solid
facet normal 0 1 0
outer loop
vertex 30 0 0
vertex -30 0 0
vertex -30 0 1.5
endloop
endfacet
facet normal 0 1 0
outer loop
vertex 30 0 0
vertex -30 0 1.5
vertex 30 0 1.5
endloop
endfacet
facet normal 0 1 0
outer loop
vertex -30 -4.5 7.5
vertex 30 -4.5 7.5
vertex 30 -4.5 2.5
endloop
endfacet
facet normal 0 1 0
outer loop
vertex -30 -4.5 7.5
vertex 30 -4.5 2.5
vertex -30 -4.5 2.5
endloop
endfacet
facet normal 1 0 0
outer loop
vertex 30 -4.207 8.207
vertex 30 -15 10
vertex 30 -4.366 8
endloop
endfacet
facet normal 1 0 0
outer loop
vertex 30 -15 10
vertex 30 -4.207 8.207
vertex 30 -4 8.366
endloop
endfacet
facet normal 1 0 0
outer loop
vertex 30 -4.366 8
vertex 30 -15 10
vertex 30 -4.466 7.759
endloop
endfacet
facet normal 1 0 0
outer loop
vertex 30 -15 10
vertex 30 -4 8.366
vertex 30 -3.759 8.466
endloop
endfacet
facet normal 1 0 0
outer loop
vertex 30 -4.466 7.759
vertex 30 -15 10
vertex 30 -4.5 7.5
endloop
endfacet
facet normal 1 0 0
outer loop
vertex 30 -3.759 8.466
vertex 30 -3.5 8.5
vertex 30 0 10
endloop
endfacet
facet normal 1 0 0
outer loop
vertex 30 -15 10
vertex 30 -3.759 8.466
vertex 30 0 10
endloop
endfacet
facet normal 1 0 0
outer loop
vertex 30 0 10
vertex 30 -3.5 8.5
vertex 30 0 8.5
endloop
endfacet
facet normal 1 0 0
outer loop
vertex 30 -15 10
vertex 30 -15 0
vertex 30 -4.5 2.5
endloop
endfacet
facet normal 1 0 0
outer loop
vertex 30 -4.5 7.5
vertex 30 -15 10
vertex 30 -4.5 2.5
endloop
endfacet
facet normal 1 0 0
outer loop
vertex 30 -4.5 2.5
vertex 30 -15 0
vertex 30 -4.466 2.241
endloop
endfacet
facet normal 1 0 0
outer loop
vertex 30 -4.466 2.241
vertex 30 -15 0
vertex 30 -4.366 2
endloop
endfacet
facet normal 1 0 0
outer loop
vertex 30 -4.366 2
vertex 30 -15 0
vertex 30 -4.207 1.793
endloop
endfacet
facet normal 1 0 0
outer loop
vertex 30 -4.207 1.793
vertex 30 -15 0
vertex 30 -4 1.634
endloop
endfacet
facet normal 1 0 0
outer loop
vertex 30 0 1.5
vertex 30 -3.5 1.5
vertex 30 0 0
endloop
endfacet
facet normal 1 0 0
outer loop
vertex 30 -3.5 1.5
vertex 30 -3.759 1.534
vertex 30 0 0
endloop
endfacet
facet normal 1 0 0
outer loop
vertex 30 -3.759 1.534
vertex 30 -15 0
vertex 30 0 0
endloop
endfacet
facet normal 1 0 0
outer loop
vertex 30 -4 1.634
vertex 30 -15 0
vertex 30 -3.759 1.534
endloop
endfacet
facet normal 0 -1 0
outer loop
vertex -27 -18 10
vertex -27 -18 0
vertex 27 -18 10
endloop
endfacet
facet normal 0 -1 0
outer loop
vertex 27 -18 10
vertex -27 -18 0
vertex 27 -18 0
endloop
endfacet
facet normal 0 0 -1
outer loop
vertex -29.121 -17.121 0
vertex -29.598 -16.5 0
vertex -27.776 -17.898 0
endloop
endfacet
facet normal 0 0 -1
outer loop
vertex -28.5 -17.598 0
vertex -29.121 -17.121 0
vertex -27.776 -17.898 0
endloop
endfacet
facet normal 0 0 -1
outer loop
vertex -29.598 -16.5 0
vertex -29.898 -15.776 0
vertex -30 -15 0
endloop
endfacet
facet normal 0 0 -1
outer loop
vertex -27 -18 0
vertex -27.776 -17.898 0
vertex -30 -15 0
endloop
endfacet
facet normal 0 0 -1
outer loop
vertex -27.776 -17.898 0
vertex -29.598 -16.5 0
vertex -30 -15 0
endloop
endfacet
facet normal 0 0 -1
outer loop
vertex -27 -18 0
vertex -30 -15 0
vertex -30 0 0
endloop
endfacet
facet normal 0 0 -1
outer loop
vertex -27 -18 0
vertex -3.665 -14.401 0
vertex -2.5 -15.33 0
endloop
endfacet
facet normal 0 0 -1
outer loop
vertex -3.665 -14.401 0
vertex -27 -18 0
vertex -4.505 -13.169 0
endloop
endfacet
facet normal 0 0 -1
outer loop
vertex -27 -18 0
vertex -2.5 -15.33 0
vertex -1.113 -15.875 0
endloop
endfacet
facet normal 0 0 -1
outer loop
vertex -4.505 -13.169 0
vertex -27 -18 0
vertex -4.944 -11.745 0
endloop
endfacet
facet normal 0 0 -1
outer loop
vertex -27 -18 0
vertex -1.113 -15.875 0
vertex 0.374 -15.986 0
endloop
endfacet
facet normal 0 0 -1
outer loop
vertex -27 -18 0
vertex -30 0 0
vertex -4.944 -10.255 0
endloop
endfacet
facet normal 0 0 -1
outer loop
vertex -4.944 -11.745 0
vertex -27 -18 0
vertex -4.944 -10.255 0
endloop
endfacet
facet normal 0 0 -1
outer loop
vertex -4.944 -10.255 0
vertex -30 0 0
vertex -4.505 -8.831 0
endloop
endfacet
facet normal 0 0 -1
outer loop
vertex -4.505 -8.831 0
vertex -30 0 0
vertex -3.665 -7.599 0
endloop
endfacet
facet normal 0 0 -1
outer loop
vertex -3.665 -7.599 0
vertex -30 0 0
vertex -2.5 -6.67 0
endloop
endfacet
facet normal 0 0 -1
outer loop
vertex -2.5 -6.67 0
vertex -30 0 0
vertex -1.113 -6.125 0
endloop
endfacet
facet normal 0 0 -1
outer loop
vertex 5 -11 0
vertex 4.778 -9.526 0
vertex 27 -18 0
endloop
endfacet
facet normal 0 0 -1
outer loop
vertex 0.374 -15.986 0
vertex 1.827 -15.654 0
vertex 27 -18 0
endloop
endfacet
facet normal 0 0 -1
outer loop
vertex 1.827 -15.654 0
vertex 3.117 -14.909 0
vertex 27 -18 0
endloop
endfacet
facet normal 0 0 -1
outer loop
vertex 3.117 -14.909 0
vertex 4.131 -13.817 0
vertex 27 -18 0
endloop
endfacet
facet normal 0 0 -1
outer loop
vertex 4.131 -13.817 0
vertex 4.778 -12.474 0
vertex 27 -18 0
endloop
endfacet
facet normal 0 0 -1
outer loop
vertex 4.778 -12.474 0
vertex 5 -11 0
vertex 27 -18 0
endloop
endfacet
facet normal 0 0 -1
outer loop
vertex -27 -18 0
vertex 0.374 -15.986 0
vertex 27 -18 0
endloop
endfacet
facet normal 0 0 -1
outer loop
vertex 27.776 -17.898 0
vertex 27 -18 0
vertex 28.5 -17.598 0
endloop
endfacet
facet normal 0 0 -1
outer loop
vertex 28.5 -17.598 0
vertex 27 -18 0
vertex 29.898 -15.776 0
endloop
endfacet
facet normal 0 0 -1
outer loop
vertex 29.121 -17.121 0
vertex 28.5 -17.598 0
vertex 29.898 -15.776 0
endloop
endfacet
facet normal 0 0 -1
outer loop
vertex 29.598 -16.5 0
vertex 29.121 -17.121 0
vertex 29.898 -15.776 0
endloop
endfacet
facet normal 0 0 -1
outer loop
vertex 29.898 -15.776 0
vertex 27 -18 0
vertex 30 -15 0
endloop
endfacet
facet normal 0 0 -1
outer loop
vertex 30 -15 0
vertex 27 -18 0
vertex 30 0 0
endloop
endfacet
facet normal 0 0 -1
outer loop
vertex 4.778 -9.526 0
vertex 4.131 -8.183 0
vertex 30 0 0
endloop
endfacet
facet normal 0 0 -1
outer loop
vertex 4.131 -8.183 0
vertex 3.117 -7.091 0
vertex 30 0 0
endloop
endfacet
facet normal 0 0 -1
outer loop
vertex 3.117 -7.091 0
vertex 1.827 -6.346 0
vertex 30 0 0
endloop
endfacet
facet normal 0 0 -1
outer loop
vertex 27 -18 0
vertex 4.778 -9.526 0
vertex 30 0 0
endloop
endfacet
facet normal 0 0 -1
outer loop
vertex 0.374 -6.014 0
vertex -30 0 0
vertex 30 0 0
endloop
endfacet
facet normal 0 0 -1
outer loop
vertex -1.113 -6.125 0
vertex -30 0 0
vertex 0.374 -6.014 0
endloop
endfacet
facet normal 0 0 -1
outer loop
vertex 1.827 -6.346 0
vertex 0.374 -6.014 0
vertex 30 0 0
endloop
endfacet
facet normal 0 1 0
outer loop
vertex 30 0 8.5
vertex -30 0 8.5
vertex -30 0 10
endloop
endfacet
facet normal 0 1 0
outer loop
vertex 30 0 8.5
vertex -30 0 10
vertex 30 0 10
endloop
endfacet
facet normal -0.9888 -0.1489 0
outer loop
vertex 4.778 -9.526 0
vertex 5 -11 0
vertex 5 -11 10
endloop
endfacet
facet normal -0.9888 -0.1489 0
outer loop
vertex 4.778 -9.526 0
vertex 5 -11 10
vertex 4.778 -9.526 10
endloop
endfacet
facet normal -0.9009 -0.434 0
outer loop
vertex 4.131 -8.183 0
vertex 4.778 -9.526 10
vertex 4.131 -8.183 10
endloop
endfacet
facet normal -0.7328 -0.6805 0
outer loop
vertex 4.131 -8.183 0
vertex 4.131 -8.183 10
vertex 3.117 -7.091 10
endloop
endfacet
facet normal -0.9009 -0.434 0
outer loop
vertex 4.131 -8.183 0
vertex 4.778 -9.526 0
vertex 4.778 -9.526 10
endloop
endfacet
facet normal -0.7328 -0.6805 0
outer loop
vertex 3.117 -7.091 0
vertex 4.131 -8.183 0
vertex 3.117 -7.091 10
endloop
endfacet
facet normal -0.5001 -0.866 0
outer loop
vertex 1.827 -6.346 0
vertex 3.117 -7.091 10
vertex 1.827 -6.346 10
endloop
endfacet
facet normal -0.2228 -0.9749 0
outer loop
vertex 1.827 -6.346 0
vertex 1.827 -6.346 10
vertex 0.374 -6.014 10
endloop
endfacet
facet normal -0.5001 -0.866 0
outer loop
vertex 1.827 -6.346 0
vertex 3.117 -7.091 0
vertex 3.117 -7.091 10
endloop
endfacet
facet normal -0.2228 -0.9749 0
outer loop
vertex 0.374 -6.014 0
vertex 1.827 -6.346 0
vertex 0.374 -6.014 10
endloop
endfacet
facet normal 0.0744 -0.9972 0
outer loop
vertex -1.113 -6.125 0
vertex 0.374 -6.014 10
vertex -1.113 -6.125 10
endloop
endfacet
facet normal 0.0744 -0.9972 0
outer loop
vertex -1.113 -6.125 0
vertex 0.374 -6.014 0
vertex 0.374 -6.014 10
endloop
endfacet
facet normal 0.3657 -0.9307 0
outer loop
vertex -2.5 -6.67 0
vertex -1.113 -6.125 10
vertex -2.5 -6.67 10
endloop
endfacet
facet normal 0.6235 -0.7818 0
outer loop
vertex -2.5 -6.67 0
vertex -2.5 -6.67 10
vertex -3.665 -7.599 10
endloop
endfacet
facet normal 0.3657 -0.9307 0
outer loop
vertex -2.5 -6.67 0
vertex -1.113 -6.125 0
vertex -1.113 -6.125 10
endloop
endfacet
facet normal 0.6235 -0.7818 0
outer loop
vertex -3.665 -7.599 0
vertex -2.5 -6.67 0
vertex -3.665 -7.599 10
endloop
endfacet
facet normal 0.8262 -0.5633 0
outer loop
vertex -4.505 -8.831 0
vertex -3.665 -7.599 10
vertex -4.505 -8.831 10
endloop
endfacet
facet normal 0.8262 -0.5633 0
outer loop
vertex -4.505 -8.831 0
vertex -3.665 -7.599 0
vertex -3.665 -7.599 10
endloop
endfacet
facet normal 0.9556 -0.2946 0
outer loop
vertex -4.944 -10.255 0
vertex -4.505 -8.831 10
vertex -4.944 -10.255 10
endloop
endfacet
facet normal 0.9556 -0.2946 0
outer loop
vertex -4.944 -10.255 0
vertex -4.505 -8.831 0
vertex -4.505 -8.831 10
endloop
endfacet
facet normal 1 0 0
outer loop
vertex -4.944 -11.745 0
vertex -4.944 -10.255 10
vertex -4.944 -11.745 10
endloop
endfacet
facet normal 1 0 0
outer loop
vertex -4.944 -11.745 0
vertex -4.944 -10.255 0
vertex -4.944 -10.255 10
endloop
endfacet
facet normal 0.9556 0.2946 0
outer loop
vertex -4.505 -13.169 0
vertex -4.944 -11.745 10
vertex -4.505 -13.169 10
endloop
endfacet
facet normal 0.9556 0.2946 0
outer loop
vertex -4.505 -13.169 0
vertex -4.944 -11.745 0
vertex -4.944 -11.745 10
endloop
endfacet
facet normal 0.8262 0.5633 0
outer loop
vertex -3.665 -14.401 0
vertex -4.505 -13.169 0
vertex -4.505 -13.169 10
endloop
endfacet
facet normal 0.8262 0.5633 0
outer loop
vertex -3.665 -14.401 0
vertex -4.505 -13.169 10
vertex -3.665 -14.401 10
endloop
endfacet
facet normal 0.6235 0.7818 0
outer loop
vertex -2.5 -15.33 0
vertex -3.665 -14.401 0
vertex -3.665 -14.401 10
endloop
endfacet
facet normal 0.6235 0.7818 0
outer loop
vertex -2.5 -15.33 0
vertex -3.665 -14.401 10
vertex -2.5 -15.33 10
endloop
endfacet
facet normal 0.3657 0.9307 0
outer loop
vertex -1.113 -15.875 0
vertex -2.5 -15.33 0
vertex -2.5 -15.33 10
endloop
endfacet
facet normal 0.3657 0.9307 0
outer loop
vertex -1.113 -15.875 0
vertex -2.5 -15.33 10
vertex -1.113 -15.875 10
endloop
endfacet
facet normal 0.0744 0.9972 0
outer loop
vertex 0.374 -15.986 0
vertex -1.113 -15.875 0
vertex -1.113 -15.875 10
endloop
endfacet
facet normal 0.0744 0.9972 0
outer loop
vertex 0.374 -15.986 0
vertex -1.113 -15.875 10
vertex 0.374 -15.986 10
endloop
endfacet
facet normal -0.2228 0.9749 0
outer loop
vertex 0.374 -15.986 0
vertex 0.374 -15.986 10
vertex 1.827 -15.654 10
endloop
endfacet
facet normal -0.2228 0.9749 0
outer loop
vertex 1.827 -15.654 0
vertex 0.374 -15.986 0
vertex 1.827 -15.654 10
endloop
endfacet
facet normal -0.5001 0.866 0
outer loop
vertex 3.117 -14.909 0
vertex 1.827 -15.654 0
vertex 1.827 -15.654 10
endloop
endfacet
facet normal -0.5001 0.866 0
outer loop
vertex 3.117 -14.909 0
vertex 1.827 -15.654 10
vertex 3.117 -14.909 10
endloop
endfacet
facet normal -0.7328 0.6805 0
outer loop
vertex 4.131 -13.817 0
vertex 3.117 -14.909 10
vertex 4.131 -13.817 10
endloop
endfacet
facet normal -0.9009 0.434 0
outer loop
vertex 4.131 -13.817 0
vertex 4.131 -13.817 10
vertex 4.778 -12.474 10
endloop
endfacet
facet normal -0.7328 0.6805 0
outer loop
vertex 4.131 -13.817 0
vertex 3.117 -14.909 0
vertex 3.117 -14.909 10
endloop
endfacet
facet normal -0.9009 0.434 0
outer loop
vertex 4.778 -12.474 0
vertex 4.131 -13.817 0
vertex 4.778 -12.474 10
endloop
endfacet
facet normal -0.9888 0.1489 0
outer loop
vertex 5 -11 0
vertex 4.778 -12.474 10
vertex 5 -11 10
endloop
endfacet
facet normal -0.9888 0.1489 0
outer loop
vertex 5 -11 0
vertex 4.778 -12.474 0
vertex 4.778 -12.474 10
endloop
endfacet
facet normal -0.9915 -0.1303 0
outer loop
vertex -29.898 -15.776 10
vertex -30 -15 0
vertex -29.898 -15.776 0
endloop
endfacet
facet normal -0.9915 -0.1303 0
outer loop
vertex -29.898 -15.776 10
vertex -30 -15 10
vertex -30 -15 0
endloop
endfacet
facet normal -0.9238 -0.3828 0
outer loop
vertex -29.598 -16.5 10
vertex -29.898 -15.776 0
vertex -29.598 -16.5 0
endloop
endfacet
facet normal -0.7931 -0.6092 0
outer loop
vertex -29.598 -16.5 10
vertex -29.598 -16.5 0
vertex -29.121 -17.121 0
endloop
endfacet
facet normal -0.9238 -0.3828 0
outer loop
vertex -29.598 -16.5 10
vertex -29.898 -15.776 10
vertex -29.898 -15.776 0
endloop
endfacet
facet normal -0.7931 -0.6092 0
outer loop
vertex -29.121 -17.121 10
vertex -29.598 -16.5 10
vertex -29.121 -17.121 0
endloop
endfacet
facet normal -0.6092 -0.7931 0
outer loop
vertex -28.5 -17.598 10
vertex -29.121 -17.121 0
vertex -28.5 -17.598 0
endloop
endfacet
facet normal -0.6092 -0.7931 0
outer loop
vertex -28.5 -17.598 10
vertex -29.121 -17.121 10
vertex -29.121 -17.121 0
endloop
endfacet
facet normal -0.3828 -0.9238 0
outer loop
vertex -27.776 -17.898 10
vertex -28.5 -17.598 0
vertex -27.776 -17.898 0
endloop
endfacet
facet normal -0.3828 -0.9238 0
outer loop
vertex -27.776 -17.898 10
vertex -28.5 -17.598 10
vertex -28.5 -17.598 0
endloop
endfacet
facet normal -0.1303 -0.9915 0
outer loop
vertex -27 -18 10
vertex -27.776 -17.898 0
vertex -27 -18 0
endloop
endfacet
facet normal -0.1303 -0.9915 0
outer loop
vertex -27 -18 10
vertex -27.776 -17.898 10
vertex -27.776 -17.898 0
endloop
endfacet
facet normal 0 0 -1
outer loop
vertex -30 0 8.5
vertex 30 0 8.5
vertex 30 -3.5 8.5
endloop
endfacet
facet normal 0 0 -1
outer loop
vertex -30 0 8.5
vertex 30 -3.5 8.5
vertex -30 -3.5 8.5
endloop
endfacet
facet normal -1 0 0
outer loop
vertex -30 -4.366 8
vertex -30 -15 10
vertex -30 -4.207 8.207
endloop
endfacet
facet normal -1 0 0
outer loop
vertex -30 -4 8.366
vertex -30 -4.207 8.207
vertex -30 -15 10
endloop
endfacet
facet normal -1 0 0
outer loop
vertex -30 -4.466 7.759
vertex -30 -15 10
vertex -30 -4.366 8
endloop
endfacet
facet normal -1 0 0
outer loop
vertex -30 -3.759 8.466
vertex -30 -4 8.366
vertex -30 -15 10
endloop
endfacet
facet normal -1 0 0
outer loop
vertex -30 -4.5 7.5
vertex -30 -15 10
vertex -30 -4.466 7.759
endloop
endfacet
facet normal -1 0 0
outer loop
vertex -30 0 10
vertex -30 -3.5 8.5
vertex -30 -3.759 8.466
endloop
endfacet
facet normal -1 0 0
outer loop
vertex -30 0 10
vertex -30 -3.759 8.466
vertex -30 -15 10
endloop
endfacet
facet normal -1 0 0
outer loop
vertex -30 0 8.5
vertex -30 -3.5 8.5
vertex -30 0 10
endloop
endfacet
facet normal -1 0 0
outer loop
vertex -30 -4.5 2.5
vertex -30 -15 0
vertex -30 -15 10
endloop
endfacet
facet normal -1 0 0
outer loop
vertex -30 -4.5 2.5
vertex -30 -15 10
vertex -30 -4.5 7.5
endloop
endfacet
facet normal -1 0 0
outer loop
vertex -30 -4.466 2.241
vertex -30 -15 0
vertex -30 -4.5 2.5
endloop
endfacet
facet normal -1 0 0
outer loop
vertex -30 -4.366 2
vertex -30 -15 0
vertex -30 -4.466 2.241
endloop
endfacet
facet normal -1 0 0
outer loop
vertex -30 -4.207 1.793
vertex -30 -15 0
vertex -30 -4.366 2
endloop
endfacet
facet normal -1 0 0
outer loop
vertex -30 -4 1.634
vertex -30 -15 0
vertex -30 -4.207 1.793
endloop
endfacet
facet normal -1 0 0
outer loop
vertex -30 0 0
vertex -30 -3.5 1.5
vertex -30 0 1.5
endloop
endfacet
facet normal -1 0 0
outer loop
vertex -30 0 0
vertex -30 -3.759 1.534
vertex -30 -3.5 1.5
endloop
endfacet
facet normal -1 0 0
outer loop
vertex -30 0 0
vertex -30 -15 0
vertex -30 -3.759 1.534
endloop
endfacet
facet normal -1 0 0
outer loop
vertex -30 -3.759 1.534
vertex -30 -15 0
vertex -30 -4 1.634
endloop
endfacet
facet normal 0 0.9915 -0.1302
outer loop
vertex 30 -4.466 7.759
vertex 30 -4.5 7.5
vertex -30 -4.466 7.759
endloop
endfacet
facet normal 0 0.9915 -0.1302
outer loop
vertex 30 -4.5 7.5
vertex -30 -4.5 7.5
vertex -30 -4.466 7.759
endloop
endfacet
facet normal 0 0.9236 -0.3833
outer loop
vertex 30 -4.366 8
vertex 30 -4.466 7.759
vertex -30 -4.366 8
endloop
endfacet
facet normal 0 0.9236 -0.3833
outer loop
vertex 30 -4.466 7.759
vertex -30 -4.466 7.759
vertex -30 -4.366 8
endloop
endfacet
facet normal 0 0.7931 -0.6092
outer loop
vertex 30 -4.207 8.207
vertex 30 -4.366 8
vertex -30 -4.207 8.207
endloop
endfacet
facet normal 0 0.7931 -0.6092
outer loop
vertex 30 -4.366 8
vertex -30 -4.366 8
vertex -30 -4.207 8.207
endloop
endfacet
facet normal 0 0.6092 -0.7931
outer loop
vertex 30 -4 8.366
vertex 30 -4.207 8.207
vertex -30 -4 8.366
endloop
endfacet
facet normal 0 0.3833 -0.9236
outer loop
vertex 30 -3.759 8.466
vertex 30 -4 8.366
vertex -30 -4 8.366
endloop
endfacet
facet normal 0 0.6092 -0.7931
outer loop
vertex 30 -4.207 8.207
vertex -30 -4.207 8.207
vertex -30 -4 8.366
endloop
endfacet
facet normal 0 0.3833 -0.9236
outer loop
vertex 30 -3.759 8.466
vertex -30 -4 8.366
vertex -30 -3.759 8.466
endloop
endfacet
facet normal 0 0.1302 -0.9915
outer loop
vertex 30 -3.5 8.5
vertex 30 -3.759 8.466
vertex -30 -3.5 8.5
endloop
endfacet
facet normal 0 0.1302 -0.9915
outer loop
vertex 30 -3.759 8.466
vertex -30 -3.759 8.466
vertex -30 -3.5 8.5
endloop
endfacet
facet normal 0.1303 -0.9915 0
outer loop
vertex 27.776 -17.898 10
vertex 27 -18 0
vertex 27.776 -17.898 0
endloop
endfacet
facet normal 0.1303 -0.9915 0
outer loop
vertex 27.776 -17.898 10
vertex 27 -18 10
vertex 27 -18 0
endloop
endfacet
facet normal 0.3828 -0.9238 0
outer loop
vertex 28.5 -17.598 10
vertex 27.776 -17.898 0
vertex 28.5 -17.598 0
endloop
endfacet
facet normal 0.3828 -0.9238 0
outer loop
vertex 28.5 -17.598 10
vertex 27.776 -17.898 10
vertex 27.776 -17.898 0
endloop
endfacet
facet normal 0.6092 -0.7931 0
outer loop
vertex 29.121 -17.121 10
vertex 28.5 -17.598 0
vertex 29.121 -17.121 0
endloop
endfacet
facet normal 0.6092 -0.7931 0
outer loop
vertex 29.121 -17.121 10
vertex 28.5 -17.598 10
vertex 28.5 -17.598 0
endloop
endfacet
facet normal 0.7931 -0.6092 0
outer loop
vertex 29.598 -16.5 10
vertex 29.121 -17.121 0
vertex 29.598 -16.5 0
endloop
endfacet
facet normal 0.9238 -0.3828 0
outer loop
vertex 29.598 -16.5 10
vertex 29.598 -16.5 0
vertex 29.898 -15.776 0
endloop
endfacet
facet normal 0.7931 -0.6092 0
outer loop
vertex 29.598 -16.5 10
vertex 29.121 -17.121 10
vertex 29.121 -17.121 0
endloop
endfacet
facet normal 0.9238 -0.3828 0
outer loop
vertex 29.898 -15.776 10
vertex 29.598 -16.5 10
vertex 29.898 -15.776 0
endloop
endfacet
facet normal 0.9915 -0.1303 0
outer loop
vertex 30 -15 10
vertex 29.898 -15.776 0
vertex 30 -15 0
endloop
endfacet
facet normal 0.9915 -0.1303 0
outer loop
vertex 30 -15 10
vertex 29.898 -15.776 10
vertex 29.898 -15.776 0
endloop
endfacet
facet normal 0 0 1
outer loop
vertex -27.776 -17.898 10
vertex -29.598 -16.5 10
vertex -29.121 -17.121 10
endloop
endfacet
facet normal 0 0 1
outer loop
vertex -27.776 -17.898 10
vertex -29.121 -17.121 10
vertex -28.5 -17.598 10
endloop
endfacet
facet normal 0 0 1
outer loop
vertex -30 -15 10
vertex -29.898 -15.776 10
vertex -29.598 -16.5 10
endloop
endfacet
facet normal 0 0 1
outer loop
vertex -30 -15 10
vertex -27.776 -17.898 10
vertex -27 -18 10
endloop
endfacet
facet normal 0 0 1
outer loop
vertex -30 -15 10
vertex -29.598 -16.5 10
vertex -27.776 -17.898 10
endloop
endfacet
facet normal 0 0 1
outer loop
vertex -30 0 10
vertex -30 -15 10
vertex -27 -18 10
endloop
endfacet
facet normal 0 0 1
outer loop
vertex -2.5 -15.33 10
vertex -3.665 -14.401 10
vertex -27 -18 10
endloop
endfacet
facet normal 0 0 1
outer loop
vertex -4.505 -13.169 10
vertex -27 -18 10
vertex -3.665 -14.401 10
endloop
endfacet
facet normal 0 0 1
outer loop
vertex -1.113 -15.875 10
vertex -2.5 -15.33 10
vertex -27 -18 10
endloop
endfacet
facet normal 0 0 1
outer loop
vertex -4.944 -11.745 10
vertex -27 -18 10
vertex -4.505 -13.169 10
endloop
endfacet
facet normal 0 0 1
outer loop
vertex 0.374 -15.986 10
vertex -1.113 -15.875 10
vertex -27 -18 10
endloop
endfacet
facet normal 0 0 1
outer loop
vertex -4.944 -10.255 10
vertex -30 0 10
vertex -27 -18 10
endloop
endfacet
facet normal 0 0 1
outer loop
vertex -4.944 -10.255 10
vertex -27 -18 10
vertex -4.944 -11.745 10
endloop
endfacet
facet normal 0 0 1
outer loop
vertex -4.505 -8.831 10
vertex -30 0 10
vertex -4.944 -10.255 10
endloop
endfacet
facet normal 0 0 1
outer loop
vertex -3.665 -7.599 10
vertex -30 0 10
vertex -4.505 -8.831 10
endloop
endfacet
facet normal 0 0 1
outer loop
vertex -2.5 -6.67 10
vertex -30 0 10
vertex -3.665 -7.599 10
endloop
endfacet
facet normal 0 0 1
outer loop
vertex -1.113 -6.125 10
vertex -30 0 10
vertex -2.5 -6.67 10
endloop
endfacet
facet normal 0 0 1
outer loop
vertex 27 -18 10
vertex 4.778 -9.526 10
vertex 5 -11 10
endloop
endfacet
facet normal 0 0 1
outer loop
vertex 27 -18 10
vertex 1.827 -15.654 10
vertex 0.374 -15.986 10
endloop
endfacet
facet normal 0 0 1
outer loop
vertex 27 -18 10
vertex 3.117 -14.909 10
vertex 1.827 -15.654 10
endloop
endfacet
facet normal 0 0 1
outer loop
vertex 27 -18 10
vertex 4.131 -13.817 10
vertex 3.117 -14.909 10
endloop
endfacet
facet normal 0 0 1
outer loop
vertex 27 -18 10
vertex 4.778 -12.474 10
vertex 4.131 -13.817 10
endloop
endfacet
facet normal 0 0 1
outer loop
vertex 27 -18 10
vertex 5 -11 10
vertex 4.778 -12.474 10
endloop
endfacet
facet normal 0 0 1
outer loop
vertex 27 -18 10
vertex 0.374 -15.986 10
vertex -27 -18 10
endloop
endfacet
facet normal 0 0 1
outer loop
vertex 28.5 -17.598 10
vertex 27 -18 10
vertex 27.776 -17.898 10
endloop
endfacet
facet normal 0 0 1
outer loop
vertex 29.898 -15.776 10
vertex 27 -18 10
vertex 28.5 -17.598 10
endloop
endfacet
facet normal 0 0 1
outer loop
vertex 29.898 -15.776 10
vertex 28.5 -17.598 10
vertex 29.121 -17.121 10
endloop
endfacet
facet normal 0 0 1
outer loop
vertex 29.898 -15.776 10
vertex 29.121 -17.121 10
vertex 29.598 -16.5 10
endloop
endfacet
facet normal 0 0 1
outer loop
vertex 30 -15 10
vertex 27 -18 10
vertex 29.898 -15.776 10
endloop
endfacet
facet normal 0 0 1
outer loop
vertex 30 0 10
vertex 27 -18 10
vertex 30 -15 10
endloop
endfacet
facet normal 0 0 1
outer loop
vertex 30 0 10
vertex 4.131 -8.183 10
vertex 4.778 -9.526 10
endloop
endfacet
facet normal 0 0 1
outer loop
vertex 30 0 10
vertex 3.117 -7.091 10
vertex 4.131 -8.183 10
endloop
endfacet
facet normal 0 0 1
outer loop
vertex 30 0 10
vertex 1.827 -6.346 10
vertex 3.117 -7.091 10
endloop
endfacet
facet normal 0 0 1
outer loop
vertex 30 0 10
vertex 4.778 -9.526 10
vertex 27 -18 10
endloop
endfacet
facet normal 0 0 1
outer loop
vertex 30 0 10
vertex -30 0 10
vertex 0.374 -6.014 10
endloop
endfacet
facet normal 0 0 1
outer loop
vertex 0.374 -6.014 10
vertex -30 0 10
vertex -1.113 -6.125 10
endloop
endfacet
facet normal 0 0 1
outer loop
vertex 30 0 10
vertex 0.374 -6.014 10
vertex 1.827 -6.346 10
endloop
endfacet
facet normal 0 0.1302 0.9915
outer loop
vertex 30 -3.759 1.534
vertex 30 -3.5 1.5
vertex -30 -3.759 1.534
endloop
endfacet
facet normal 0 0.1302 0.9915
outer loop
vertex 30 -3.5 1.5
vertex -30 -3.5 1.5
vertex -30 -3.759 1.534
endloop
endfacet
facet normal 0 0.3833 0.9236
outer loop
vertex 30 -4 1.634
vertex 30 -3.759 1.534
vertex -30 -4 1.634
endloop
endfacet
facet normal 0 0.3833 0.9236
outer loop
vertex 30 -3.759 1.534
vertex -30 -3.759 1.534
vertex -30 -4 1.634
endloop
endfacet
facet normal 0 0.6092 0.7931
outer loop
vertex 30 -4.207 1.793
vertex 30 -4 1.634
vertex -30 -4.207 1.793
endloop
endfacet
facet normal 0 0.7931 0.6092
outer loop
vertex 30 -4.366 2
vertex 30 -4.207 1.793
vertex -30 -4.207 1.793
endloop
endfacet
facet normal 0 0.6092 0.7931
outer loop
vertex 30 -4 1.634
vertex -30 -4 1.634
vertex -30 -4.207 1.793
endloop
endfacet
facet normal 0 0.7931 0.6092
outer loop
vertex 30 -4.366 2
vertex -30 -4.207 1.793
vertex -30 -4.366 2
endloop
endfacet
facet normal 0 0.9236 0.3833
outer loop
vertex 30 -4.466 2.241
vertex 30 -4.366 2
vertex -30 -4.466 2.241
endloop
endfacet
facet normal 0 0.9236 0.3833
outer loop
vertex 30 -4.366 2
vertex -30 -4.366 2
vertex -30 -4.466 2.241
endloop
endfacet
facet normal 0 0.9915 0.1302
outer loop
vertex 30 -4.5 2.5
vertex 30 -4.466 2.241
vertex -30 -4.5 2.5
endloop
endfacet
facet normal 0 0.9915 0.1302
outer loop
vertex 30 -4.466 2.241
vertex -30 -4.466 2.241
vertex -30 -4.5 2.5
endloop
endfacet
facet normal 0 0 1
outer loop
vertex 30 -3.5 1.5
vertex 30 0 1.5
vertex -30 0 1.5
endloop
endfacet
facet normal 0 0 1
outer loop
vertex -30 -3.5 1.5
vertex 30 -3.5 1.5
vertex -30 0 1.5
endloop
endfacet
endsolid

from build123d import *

# Parameters (mm, degrees)
F0_W     = 60
F0_H     = 18
F0_R     = 5
F1_DEPTH = 10
F2_R     = 3
F3_W     = 60
F3_H     = 7
F4_DEPTH = 4.5
F5_R     = 1


with BuildPart() as f1:
    # F0 (on Top) → F1 (new body)
    with BuildSketch(Plane.XY):
        with Locations((0, -9)):
            Rectangle(F0_W, F0_H)
        with Locations((0, -11)):
            Circle(F0_R, mode=Mode.SUBTRACT)
    extrude(amount=F1_DEPTH)

    # F2
    f2_edges = [f1.edges().sort_by_distance(p)[0] for p in [
        (-30, -18, 5),
        (30, -18, 5),
    ]]
    fillet(f2_edges, radius=F2_R)

    # F3 (on face) → F4 (cut)
    with BuildSketch(Plane(origin=(0, 0, 0), x_dir=(-1, 0, 0), z_dir=(0, 1, 0))):
        with Locations((0, 5)):
            Rectangle(F3_W, F3_H)
    extrude(amount=-F4_DEPTH, mode=Mode.SUBTRACT)

    # F5
    f5_edges = [f1.edges().sort_by_distance(p)[0] for p in [
        (0, -4.5, 8.5),
        (0, -4.5, 1.5),
    ]]
    fillet(f5_edges, radius=F5_R)


solid = f1.part
